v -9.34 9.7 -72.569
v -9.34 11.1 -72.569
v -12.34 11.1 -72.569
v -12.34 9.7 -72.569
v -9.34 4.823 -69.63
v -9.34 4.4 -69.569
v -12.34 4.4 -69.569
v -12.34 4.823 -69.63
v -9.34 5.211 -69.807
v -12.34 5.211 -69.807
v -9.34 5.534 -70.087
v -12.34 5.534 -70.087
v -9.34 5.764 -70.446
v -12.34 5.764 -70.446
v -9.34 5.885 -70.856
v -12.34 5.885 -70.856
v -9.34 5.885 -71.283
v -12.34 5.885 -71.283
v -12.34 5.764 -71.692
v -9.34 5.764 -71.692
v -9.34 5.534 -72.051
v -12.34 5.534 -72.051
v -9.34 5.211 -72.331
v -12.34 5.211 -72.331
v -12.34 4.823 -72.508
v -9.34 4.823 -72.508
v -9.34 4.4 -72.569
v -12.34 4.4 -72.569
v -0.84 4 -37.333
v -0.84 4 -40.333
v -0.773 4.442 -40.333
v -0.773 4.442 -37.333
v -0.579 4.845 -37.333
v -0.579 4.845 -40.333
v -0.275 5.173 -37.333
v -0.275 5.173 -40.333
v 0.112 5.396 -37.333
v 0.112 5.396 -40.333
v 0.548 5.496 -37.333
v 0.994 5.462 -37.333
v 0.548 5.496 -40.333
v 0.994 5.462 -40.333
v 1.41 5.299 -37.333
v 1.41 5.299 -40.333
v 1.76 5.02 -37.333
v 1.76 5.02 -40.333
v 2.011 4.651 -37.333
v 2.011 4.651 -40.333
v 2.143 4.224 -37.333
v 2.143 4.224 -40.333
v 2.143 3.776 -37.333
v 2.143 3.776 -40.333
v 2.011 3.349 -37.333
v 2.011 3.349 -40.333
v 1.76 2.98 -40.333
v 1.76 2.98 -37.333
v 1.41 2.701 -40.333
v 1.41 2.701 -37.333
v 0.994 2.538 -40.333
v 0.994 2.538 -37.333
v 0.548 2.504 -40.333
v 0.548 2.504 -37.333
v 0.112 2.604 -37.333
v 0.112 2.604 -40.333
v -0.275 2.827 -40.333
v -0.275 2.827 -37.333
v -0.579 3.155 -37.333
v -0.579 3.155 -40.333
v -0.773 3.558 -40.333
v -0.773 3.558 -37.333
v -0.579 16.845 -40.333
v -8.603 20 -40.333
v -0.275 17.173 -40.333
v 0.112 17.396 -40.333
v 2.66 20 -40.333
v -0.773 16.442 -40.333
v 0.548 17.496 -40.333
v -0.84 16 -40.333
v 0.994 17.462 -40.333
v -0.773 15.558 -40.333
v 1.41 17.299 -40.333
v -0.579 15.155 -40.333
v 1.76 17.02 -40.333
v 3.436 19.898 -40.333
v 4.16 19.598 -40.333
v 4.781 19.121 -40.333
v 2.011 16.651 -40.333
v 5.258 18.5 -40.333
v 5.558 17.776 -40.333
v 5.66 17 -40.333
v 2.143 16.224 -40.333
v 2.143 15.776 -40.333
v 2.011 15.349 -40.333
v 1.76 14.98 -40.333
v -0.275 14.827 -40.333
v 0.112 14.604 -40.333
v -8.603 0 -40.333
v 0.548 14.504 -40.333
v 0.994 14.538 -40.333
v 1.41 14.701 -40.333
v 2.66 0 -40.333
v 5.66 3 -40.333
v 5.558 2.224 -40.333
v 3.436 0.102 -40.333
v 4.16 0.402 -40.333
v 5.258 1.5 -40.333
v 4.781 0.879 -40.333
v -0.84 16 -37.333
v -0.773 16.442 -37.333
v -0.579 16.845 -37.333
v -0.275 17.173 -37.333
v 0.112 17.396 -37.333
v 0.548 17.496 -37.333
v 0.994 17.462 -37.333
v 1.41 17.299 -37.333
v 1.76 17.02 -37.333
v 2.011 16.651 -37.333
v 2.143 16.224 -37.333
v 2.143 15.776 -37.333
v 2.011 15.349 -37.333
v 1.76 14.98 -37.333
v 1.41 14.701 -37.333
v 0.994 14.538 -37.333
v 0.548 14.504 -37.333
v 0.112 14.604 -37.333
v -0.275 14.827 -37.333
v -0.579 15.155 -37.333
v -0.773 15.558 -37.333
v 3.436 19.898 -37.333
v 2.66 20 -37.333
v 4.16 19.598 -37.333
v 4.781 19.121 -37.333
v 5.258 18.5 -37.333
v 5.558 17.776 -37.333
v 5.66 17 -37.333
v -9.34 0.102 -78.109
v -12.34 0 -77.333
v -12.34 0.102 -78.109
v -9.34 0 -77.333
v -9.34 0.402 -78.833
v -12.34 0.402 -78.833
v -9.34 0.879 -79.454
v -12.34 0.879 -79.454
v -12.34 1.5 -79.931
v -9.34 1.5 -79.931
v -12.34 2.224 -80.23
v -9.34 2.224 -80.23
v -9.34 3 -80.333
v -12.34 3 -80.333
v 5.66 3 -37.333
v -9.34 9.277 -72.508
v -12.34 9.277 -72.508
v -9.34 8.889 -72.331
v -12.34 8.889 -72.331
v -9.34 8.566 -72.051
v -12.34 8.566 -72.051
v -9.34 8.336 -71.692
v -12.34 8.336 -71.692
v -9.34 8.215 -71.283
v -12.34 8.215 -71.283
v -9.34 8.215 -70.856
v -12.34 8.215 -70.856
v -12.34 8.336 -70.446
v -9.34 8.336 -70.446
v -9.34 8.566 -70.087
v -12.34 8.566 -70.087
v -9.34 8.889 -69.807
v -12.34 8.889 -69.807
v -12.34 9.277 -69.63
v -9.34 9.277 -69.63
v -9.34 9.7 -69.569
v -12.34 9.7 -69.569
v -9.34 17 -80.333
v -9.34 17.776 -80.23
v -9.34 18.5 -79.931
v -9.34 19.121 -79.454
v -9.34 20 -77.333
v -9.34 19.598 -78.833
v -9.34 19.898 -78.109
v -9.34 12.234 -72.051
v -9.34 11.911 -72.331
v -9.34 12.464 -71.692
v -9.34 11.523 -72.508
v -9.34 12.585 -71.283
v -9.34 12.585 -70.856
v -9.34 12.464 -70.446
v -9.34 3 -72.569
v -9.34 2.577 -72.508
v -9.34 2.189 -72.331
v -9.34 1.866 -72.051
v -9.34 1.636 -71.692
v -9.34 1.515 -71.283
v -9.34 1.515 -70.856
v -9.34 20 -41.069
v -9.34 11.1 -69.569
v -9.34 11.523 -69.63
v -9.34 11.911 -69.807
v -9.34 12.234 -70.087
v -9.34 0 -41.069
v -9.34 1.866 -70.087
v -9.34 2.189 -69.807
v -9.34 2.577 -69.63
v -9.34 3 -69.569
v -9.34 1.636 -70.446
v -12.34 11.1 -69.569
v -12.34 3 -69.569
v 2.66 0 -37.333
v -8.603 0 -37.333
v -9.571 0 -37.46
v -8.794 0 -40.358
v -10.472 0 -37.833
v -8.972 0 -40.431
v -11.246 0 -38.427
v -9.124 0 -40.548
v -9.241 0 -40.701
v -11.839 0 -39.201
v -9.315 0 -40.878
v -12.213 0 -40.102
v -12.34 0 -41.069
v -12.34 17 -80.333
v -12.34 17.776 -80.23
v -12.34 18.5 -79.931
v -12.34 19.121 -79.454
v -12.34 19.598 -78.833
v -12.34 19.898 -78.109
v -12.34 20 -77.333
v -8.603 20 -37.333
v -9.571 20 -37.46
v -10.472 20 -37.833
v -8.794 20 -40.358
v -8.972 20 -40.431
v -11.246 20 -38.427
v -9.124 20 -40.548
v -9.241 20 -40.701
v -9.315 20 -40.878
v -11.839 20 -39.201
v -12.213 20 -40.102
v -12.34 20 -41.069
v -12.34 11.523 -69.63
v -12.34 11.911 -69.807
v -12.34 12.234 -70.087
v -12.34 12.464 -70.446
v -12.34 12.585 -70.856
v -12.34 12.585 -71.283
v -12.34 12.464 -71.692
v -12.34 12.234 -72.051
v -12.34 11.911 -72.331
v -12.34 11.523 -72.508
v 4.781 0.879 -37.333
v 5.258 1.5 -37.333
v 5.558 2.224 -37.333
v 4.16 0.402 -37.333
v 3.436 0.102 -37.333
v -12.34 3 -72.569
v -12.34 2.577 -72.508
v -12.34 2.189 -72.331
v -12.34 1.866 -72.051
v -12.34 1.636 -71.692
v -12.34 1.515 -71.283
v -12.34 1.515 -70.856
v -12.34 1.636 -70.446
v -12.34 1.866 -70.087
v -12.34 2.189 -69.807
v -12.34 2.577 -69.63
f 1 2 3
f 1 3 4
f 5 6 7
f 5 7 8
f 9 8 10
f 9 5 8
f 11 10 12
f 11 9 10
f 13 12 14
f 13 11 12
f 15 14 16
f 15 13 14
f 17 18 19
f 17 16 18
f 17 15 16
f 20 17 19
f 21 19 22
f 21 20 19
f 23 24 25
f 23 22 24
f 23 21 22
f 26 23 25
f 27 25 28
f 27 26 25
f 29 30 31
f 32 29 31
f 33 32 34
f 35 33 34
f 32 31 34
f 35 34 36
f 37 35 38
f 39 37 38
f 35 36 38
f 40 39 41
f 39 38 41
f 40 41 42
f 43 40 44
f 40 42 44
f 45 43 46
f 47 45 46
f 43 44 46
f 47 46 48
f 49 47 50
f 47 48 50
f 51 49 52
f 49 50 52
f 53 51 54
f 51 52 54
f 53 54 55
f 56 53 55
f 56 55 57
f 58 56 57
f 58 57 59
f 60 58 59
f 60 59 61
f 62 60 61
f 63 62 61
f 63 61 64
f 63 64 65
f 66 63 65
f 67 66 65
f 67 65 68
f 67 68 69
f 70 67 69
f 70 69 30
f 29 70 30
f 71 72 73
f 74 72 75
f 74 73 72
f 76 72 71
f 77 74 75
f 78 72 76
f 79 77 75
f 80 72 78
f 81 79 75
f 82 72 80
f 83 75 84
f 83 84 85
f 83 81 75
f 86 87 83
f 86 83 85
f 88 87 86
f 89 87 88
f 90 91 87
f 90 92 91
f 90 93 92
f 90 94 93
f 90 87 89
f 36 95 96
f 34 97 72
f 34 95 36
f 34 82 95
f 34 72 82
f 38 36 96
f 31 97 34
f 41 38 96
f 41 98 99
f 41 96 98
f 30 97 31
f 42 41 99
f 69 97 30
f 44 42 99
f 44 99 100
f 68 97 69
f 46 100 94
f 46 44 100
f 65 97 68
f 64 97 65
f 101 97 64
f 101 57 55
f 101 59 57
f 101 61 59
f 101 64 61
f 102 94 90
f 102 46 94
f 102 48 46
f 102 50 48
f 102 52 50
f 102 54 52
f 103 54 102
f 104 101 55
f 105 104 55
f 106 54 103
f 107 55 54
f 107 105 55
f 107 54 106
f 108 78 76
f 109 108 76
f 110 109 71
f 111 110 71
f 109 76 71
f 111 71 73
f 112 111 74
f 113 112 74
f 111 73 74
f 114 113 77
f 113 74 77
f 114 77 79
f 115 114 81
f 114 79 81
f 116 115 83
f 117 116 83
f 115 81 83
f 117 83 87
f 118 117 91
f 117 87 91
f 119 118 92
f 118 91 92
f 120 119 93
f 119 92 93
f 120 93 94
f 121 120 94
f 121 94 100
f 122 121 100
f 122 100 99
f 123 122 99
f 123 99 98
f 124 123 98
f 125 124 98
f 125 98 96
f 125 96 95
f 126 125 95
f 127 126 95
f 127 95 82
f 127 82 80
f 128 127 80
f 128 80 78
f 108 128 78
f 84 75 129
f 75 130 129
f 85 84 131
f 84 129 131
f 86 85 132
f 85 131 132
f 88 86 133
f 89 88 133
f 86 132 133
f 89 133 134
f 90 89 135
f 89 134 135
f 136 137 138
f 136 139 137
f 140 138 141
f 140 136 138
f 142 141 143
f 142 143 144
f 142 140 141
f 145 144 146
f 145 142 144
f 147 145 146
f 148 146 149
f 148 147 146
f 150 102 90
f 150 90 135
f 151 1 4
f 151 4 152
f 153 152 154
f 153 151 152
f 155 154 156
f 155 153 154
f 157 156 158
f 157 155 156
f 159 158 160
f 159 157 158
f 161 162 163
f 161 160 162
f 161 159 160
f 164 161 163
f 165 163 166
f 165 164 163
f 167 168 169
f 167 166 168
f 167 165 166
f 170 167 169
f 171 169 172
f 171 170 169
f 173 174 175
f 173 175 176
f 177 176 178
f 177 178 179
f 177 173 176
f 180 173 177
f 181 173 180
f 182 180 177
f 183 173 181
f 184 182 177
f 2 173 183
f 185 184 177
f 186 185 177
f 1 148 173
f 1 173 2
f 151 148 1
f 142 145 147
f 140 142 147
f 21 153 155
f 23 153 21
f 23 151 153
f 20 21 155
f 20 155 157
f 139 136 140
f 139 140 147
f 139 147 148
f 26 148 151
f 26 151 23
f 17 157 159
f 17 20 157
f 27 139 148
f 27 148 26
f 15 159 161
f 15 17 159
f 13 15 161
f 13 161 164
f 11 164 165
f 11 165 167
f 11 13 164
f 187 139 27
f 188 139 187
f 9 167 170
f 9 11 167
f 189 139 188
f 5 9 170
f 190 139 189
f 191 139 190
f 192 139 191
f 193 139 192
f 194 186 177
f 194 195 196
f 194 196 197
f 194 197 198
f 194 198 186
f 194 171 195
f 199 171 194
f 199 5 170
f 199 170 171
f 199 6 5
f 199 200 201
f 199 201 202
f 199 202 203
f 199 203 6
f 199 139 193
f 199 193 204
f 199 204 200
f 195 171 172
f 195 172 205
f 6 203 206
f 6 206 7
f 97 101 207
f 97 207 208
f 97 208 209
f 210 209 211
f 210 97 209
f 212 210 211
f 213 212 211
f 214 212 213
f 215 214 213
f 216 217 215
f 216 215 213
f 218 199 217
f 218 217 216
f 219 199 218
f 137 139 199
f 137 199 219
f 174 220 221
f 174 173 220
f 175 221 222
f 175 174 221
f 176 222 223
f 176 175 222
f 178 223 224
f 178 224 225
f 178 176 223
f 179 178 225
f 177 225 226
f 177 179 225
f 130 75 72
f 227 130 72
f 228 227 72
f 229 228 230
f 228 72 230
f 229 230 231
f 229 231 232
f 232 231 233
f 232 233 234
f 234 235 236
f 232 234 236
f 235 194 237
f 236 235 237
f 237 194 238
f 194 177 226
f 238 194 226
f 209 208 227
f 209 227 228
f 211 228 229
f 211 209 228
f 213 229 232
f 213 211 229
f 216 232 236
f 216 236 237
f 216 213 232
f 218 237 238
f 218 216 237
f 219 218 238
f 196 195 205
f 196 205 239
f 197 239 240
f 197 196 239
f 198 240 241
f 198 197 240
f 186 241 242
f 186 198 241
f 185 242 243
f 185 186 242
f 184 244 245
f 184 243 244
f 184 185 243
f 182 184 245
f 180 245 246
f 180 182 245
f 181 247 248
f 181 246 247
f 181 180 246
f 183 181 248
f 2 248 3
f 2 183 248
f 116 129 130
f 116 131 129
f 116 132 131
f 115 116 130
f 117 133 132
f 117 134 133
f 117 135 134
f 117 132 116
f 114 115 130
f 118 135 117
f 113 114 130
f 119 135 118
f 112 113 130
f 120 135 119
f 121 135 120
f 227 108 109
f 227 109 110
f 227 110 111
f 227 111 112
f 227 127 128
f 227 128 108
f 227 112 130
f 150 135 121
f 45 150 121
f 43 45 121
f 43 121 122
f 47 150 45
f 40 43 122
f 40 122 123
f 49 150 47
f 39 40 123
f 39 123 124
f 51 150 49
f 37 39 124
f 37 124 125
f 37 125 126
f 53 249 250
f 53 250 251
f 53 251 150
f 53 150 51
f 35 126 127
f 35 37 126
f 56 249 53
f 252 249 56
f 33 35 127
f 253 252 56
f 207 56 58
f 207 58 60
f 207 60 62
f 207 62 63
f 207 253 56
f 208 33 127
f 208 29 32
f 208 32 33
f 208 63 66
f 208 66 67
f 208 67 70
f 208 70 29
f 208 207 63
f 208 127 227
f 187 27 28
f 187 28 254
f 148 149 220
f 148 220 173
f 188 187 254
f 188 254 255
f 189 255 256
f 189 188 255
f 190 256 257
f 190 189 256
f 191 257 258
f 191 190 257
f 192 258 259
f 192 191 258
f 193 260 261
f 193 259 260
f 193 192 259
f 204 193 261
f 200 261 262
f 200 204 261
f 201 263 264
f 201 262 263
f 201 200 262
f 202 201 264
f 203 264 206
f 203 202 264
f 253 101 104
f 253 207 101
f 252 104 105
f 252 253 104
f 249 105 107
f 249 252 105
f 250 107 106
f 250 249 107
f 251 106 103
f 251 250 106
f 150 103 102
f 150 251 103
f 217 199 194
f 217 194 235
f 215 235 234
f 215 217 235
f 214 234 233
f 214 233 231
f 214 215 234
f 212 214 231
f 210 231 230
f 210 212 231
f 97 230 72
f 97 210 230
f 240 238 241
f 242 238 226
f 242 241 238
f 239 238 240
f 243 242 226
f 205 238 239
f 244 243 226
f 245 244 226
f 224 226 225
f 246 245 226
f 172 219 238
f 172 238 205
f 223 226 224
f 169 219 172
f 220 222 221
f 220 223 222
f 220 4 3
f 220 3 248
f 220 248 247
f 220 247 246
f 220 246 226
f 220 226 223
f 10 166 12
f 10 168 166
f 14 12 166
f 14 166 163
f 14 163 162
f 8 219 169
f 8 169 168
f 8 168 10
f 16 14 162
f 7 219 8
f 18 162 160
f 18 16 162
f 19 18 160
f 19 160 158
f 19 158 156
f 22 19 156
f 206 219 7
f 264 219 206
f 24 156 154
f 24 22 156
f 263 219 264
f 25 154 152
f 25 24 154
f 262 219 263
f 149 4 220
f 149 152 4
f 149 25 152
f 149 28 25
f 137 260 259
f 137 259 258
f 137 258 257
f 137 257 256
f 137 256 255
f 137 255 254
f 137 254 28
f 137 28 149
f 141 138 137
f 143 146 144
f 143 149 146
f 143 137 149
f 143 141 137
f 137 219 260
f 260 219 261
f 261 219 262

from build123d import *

# Parameters (mm, degrees)
BASE_FLANGE1_DEPTH = 20
CUT_EXTRUDE1_REACH = 48.393
SKETCH6_R          = 1.5
FILLET1_R          = 3
FILLET2_R          = 3
CUT_EXTRUDE4_DEPTH = 85.132737956


# Sheet-metal steps are written as plain solids
with BuildPart() as part:
    # Sketch1 → Base-Flange1 (new body)
    with BuildSketch(Plane(origin=(0, 0, 0), x_dir=(1, 0, 0), z_dir=(0, 1, 0))):
        with BuildLine():
            Line((-9.340010949, 80.332543816), (-9.340010949, 41.069143816))
            ThreePointArc((-9.340010949, 41.069143816), (-9.124265804, 40.548288961), (-8.603410949, 40.332543816))
            Line((-8.603410949, 40.332543816), (5.659989051, 40.332543816))
            Line((5.659989051, 40.332543816), (5.659989051, 37.332543816))
            Line((5.659989051, 37.332543816), (-8.603410949, 37.332543816))
            ThreePointArc((-8.603410949, 37.332543816), (-11.245586147, 38.426968618), (-12.340010949, 41.069143816))
            Line((-12.340010949, 41.069143816), (-12.340010949, 80.332543816))
            Line((-12.340010949, 80.332543816), (-9.340010949, 80.332543816))
        make_face()
    extrude(amount=BASE_FLANGE1_DEPTH)

    # Sketch6 → Cut-Extrude1 (cut, up to next)
    with BuildSketch(Plane(origin=(0, 0, -40.332543816), x_dir=(-1, 0, 0), z_dir=(0, 0, -1)), mode=Mode.PRIVATE) as cut_extrude1_sk1:
        with Locations((-0.659989051, 16)):
            Circle(SKETCH6_R)
    cut_extrude1_tool1 = extrude(cut_extrude1_sk1.sketch, amount=-CUT_EXTRUDE1_REACH, mode=Mode.PRIVATE) & part.part
    # Sketch6 → Cut-Extrude1 (cut, up to next)
    with BuildSketch(Plane(origin=(0, 0, -40.332543816), x_dir=(-1, 0, 0), z_dir=(0, 0, -1)), mode=Mode.PRIVATE) as cut_extrude1_sk2:
        with Locations((-0.659989051, 4)):
            Circle(SKETCH6_R)
    cut_extrude1_tool2 = extrude(cut_extrude1_sk2.sketch, amount=-CUT_EXTRUDE1_REACH, mode=Mode.PRIVATE) & part.part
    add(cut_extrude1_tool1.solids().sort_by_distance((0.659989, 16, -40.332544))[0], mode=Mode.SUBTRACT)
    add(cut_extrude1_tool2.solids().sort_by_distance((0.659989, 4, -40.332544))[0], mode=Mode.SUBTRACT)

    # Fillet1
    fillet1_edges = [part.edges().sort_by_distance(p)[0] for p in [
        (5.659989051, 20, -38.832543816),
        (5.659989051, 0, -38.832543816),
    ]]
    fillet(fillet1_edges, radius=FILLET1_R)

    # Fillet2
    fillet2_edges = [part.edges().sort_by_distance(p)[0] for p in [
        (-10.840010949, 20, -80.332543816),
        (-10.840010949, 0, -80.332543816),
    ]]
    fillet(fillet2_edges, radius=FILLET2_R)

    # Sketch7 → Cut-Extrude4 (cut, through all)
    with BuildSketch(Plane(origin=(-9.340010949, 0, 0), x_dir=(0, 0, -1), z_dir=(1, 0, 0))):
        with BuildLine():
            Line((72.569143816, 11.1), (72.569143816, 9.7))
            ThreePointArc((72.569143816, 9.7), (71.069143816, 8.2), (69.569143816, 9.7))
            Line((69.569143816, 9.7), (69.569143816, 11.1))
            ThreePointArc((69.569143816, 11.1), (71.069143816, 12.6), (72.569143816, 11.1))
        make_face()
        with BuildLine():
            Line((72.569143816, 4.4), (72.569143816, 3))
            ThreePointArc((72.569143816, 3), (71.069143816, 1.5), (69.569143816, 3))
            Line((69.569143816, 3), (69.569143816, 4.4))
            ThreePointArc((69.569143816, 4.4), (71.069143816, 5.9), (72.569143816, 4.4))
        make_face()
    extrude(amount=-CUT_EXTRUDE4_DEPTH, mode=Mode.SUBTRACT)


solid = part.part
